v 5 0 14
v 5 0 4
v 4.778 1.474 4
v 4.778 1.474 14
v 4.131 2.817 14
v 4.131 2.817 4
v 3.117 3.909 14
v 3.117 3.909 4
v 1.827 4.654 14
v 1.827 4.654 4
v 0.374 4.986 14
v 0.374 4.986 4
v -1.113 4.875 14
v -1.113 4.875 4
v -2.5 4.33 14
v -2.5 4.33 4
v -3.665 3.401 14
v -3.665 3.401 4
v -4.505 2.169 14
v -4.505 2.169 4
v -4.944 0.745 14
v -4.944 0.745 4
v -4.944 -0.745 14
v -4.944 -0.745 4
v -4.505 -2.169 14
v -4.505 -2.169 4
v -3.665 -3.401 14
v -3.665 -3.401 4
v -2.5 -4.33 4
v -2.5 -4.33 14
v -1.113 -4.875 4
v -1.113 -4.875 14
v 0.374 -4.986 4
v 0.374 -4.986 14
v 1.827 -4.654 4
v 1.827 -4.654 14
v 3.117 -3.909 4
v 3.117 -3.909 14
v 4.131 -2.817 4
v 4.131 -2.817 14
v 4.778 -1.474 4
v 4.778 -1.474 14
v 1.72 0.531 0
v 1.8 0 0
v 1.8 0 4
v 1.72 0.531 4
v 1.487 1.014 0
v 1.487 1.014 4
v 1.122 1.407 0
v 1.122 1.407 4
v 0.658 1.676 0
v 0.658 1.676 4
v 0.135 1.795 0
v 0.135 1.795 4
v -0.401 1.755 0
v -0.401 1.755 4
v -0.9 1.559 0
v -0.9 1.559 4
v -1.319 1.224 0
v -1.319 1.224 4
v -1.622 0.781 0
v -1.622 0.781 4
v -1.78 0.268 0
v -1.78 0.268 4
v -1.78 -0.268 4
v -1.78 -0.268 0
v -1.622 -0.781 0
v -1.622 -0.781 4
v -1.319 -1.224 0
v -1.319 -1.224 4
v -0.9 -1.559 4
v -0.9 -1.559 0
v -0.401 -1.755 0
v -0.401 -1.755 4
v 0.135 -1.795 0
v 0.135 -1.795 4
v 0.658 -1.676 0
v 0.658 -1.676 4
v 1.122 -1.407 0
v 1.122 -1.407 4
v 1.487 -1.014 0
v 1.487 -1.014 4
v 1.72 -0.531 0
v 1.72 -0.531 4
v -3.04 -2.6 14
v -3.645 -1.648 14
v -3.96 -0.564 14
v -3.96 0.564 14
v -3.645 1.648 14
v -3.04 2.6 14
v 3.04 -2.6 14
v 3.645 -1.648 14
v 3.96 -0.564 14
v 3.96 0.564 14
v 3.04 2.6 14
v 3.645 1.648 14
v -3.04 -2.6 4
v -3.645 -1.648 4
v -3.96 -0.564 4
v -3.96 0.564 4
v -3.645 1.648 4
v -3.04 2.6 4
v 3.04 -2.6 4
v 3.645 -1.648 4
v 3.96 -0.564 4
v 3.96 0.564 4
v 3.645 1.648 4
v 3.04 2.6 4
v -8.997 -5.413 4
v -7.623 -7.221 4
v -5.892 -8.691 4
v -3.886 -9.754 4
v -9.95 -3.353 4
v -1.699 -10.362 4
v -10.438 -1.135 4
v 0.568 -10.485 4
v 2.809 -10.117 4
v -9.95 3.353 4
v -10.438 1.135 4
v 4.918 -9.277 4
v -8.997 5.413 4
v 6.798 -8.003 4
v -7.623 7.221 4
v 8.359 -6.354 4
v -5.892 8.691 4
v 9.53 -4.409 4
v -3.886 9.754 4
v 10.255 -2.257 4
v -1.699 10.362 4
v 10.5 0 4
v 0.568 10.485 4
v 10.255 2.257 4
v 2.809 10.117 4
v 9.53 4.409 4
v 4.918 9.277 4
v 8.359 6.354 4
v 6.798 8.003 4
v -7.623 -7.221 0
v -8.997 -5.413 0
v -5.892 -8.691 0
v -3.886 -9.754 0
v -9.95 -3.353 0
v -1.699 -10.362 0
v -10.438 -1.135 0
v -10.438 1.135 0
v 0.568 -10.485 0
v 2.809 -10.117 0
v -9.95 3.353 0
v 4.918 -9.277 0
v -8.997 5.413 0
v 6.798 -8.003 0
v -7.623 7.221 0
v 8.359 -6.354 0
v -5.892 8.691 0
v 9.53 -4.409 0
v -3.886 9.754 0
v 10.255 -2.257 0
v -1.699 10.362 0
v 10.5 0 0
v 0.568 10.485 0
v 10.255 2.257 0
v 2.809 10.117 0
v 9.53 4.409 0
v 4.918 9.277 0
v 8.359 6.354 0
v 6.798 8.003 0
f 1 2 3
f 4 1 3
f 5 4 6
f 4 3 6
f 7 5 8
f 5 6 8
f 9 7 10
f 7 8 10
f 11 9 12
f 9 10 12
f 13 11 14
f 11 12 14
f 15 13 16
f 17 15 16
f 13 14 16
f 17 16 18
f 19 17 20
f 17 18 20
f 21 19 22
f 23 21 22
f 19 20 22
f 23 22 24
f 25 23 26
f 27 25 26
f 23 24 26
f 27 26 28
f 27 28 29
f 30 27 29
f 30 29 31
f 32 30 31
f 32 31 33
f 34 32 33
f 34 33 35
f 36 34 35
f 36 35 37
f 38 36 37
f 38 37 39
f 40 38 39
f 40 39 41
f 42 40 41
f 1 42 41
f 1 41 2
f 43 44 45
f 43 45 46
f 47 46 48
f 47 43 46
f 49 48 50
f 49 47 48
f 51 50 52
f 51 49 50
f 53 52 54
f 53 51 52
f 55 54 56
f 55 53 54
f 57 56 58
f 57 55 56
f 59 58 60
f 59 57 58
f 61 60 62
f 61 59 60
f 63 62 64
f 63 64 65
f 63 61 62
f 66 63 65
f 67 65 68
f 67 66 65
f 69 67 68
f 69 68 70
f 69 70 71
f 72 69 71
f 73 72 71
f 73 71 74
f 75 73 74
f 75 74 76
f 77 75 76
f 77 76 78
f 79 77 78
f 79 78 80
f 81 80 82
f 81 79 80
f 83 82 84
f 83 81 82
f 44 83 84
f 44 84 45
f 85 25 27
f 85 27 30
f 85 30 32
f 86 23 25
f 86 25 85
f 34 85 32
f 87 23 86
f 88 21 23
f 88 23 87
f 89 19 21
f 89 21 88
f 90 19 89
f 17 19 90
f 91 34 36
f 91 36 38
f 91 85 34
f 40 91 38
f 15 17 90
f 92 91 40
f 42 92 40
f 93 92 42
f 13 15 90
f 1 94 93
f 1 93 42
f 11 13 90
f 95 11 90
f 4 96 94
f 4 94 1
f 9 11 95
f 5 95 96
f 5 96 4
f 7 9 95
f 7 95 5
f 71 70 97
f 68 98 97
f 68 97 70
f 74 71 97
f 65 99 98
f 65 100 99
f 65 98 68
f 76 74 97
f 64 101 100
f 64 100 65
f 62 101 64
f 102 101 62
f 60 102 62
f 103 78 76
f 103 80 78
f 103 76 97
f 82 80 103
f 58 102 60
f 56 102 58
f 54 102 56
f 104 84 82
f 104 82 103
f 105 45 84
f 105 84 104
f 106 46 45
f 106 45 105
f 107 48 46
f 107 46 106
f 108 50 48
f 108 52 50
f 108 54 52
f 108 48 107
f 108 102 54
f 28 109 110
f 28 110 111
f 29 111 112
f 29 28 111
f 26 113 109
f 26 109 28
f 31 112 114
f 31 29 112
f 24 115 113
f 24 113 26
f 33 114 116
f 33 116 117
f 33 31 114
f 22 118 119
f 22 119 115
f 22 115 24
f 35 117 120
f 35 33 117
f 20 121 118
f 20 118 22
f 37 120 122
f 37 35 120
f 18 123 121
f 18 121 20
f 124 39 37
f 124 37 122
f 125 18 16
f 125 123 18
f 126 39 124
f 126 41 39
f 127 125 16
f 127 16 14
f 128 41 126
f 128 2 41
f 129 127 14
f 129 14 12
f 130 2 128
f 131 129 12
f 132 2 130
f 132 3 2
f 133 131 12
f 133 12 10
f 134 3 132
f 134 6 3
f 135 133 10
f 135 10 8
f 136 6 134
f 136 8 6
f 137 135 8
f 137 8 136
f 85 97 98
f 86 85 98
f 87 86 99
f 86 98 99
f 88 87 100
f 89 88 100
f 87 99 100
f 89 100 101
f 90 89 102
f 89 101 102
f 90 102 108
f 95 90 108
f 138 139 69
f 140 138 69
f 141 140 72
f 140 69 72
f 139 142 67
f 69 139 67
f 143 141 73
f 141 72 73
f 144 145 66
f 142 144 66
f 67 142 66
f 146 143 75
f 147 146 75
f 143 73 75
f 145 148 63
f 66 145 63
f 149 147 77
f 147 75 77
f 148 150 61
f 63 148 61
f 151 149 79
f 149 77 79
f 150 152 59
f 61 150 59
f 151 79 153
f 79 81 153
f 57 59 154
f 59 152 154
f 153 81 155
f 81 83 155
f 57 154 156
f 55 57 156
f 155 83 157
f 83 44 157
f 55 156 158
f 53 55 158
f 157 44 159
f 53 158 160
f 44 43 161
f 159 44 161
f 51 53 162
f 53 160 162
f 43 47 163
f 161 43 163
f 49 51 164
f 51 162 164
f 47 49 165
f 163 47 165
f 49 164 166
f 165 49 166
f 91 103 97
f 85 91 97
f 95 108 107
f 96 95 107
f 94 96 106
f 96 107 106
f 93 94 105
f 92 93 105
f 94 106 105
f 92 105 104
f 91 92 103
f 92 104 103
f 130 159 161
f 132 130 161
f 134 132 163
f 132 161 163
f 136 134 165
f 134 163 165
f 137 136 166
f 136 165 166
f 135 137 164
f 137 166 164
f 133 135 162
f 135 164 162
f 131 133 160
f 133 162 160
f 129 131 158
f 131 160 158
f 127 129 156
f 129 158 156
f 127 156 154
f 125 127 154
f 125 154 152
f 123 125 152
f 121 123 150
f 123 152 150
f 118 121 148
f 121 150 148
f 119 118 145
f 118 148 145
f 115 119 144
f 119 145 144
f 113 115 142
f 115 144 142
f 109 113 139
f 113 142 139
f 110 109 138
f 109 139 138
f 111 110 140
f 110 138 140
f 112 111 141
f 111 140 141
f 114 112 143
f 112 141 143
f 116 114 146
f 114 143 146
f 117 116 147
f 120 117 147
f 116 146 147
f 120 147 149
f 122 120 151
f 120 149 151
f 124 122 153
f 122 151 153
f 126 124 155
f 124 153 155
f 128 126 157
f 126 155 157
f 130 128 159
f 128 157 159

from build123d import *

# Parameters (mm, degrees)
F0_R     = 10.5
F0_R_2   = 5
F0_R_3   = 1.8
F1_DEPTH = 4
F2_DEPTH = 14


with BuildPart() as f1:
    # F0 (on Top) → F1 (new body)
    with BuildSketch(Plane.XY):
        Circle(F0_R)
        Circle(F0_R_2, mode=Mode.SUBTRACT)
        Circle(F0_R_2)
        with BuildLine():
            ThreePointArc((3.039737, 2.6), (4, 0), (3.039737, -2.6))
            Line((3.039737, -2.6), (-3.039737, -2.6))
            ThreePointArc((-3.039737, -2.6), (-4, 0), (-3.039737, 2.6))
            Line((-3.039737, 2.6), (3.039737, 2.6))
        make_face(mode=Mode.SUBTRACT)
        with BuildLine():
            Line((-3.039737, -2.6), (3.039737, -2.6))
            ThreePointArc((3.039737, -2.6), (4, 0), (3.039737, 2.6))
            Line((3.039737, 2.6), (-3.039737, 2.6))
            ThreePointArc((-3.039737, 2.6), (-4, 0), (-3.039737, -2.6))
        make_face()
        Circle(F0_R_3, mode=Mode.SUBTRACT)
    extrude(amount=F1_DEPTH)

    # F0 (on Top) → F2 (join)
    with BuildSketch(Plane.XY):
        Circle(F0_R_2)
        with BuildLine():
            ThreePointArc((3.039737, 2.6), (4, 0), (3.039737, -2.6))
            Line((3.039737, -2.6), (-3.039737, -2.6))
            ThreePointArc((-3.039737, -2.6), (-4, 0), (-3.039737, 2.6))
            Line((-3.039737, 2.6), (3.039737, 2.6))
        make_face(mode=Mode.SUBTRACT)
    extrude(amount=F2_DEPTH)


solid = f1.part
